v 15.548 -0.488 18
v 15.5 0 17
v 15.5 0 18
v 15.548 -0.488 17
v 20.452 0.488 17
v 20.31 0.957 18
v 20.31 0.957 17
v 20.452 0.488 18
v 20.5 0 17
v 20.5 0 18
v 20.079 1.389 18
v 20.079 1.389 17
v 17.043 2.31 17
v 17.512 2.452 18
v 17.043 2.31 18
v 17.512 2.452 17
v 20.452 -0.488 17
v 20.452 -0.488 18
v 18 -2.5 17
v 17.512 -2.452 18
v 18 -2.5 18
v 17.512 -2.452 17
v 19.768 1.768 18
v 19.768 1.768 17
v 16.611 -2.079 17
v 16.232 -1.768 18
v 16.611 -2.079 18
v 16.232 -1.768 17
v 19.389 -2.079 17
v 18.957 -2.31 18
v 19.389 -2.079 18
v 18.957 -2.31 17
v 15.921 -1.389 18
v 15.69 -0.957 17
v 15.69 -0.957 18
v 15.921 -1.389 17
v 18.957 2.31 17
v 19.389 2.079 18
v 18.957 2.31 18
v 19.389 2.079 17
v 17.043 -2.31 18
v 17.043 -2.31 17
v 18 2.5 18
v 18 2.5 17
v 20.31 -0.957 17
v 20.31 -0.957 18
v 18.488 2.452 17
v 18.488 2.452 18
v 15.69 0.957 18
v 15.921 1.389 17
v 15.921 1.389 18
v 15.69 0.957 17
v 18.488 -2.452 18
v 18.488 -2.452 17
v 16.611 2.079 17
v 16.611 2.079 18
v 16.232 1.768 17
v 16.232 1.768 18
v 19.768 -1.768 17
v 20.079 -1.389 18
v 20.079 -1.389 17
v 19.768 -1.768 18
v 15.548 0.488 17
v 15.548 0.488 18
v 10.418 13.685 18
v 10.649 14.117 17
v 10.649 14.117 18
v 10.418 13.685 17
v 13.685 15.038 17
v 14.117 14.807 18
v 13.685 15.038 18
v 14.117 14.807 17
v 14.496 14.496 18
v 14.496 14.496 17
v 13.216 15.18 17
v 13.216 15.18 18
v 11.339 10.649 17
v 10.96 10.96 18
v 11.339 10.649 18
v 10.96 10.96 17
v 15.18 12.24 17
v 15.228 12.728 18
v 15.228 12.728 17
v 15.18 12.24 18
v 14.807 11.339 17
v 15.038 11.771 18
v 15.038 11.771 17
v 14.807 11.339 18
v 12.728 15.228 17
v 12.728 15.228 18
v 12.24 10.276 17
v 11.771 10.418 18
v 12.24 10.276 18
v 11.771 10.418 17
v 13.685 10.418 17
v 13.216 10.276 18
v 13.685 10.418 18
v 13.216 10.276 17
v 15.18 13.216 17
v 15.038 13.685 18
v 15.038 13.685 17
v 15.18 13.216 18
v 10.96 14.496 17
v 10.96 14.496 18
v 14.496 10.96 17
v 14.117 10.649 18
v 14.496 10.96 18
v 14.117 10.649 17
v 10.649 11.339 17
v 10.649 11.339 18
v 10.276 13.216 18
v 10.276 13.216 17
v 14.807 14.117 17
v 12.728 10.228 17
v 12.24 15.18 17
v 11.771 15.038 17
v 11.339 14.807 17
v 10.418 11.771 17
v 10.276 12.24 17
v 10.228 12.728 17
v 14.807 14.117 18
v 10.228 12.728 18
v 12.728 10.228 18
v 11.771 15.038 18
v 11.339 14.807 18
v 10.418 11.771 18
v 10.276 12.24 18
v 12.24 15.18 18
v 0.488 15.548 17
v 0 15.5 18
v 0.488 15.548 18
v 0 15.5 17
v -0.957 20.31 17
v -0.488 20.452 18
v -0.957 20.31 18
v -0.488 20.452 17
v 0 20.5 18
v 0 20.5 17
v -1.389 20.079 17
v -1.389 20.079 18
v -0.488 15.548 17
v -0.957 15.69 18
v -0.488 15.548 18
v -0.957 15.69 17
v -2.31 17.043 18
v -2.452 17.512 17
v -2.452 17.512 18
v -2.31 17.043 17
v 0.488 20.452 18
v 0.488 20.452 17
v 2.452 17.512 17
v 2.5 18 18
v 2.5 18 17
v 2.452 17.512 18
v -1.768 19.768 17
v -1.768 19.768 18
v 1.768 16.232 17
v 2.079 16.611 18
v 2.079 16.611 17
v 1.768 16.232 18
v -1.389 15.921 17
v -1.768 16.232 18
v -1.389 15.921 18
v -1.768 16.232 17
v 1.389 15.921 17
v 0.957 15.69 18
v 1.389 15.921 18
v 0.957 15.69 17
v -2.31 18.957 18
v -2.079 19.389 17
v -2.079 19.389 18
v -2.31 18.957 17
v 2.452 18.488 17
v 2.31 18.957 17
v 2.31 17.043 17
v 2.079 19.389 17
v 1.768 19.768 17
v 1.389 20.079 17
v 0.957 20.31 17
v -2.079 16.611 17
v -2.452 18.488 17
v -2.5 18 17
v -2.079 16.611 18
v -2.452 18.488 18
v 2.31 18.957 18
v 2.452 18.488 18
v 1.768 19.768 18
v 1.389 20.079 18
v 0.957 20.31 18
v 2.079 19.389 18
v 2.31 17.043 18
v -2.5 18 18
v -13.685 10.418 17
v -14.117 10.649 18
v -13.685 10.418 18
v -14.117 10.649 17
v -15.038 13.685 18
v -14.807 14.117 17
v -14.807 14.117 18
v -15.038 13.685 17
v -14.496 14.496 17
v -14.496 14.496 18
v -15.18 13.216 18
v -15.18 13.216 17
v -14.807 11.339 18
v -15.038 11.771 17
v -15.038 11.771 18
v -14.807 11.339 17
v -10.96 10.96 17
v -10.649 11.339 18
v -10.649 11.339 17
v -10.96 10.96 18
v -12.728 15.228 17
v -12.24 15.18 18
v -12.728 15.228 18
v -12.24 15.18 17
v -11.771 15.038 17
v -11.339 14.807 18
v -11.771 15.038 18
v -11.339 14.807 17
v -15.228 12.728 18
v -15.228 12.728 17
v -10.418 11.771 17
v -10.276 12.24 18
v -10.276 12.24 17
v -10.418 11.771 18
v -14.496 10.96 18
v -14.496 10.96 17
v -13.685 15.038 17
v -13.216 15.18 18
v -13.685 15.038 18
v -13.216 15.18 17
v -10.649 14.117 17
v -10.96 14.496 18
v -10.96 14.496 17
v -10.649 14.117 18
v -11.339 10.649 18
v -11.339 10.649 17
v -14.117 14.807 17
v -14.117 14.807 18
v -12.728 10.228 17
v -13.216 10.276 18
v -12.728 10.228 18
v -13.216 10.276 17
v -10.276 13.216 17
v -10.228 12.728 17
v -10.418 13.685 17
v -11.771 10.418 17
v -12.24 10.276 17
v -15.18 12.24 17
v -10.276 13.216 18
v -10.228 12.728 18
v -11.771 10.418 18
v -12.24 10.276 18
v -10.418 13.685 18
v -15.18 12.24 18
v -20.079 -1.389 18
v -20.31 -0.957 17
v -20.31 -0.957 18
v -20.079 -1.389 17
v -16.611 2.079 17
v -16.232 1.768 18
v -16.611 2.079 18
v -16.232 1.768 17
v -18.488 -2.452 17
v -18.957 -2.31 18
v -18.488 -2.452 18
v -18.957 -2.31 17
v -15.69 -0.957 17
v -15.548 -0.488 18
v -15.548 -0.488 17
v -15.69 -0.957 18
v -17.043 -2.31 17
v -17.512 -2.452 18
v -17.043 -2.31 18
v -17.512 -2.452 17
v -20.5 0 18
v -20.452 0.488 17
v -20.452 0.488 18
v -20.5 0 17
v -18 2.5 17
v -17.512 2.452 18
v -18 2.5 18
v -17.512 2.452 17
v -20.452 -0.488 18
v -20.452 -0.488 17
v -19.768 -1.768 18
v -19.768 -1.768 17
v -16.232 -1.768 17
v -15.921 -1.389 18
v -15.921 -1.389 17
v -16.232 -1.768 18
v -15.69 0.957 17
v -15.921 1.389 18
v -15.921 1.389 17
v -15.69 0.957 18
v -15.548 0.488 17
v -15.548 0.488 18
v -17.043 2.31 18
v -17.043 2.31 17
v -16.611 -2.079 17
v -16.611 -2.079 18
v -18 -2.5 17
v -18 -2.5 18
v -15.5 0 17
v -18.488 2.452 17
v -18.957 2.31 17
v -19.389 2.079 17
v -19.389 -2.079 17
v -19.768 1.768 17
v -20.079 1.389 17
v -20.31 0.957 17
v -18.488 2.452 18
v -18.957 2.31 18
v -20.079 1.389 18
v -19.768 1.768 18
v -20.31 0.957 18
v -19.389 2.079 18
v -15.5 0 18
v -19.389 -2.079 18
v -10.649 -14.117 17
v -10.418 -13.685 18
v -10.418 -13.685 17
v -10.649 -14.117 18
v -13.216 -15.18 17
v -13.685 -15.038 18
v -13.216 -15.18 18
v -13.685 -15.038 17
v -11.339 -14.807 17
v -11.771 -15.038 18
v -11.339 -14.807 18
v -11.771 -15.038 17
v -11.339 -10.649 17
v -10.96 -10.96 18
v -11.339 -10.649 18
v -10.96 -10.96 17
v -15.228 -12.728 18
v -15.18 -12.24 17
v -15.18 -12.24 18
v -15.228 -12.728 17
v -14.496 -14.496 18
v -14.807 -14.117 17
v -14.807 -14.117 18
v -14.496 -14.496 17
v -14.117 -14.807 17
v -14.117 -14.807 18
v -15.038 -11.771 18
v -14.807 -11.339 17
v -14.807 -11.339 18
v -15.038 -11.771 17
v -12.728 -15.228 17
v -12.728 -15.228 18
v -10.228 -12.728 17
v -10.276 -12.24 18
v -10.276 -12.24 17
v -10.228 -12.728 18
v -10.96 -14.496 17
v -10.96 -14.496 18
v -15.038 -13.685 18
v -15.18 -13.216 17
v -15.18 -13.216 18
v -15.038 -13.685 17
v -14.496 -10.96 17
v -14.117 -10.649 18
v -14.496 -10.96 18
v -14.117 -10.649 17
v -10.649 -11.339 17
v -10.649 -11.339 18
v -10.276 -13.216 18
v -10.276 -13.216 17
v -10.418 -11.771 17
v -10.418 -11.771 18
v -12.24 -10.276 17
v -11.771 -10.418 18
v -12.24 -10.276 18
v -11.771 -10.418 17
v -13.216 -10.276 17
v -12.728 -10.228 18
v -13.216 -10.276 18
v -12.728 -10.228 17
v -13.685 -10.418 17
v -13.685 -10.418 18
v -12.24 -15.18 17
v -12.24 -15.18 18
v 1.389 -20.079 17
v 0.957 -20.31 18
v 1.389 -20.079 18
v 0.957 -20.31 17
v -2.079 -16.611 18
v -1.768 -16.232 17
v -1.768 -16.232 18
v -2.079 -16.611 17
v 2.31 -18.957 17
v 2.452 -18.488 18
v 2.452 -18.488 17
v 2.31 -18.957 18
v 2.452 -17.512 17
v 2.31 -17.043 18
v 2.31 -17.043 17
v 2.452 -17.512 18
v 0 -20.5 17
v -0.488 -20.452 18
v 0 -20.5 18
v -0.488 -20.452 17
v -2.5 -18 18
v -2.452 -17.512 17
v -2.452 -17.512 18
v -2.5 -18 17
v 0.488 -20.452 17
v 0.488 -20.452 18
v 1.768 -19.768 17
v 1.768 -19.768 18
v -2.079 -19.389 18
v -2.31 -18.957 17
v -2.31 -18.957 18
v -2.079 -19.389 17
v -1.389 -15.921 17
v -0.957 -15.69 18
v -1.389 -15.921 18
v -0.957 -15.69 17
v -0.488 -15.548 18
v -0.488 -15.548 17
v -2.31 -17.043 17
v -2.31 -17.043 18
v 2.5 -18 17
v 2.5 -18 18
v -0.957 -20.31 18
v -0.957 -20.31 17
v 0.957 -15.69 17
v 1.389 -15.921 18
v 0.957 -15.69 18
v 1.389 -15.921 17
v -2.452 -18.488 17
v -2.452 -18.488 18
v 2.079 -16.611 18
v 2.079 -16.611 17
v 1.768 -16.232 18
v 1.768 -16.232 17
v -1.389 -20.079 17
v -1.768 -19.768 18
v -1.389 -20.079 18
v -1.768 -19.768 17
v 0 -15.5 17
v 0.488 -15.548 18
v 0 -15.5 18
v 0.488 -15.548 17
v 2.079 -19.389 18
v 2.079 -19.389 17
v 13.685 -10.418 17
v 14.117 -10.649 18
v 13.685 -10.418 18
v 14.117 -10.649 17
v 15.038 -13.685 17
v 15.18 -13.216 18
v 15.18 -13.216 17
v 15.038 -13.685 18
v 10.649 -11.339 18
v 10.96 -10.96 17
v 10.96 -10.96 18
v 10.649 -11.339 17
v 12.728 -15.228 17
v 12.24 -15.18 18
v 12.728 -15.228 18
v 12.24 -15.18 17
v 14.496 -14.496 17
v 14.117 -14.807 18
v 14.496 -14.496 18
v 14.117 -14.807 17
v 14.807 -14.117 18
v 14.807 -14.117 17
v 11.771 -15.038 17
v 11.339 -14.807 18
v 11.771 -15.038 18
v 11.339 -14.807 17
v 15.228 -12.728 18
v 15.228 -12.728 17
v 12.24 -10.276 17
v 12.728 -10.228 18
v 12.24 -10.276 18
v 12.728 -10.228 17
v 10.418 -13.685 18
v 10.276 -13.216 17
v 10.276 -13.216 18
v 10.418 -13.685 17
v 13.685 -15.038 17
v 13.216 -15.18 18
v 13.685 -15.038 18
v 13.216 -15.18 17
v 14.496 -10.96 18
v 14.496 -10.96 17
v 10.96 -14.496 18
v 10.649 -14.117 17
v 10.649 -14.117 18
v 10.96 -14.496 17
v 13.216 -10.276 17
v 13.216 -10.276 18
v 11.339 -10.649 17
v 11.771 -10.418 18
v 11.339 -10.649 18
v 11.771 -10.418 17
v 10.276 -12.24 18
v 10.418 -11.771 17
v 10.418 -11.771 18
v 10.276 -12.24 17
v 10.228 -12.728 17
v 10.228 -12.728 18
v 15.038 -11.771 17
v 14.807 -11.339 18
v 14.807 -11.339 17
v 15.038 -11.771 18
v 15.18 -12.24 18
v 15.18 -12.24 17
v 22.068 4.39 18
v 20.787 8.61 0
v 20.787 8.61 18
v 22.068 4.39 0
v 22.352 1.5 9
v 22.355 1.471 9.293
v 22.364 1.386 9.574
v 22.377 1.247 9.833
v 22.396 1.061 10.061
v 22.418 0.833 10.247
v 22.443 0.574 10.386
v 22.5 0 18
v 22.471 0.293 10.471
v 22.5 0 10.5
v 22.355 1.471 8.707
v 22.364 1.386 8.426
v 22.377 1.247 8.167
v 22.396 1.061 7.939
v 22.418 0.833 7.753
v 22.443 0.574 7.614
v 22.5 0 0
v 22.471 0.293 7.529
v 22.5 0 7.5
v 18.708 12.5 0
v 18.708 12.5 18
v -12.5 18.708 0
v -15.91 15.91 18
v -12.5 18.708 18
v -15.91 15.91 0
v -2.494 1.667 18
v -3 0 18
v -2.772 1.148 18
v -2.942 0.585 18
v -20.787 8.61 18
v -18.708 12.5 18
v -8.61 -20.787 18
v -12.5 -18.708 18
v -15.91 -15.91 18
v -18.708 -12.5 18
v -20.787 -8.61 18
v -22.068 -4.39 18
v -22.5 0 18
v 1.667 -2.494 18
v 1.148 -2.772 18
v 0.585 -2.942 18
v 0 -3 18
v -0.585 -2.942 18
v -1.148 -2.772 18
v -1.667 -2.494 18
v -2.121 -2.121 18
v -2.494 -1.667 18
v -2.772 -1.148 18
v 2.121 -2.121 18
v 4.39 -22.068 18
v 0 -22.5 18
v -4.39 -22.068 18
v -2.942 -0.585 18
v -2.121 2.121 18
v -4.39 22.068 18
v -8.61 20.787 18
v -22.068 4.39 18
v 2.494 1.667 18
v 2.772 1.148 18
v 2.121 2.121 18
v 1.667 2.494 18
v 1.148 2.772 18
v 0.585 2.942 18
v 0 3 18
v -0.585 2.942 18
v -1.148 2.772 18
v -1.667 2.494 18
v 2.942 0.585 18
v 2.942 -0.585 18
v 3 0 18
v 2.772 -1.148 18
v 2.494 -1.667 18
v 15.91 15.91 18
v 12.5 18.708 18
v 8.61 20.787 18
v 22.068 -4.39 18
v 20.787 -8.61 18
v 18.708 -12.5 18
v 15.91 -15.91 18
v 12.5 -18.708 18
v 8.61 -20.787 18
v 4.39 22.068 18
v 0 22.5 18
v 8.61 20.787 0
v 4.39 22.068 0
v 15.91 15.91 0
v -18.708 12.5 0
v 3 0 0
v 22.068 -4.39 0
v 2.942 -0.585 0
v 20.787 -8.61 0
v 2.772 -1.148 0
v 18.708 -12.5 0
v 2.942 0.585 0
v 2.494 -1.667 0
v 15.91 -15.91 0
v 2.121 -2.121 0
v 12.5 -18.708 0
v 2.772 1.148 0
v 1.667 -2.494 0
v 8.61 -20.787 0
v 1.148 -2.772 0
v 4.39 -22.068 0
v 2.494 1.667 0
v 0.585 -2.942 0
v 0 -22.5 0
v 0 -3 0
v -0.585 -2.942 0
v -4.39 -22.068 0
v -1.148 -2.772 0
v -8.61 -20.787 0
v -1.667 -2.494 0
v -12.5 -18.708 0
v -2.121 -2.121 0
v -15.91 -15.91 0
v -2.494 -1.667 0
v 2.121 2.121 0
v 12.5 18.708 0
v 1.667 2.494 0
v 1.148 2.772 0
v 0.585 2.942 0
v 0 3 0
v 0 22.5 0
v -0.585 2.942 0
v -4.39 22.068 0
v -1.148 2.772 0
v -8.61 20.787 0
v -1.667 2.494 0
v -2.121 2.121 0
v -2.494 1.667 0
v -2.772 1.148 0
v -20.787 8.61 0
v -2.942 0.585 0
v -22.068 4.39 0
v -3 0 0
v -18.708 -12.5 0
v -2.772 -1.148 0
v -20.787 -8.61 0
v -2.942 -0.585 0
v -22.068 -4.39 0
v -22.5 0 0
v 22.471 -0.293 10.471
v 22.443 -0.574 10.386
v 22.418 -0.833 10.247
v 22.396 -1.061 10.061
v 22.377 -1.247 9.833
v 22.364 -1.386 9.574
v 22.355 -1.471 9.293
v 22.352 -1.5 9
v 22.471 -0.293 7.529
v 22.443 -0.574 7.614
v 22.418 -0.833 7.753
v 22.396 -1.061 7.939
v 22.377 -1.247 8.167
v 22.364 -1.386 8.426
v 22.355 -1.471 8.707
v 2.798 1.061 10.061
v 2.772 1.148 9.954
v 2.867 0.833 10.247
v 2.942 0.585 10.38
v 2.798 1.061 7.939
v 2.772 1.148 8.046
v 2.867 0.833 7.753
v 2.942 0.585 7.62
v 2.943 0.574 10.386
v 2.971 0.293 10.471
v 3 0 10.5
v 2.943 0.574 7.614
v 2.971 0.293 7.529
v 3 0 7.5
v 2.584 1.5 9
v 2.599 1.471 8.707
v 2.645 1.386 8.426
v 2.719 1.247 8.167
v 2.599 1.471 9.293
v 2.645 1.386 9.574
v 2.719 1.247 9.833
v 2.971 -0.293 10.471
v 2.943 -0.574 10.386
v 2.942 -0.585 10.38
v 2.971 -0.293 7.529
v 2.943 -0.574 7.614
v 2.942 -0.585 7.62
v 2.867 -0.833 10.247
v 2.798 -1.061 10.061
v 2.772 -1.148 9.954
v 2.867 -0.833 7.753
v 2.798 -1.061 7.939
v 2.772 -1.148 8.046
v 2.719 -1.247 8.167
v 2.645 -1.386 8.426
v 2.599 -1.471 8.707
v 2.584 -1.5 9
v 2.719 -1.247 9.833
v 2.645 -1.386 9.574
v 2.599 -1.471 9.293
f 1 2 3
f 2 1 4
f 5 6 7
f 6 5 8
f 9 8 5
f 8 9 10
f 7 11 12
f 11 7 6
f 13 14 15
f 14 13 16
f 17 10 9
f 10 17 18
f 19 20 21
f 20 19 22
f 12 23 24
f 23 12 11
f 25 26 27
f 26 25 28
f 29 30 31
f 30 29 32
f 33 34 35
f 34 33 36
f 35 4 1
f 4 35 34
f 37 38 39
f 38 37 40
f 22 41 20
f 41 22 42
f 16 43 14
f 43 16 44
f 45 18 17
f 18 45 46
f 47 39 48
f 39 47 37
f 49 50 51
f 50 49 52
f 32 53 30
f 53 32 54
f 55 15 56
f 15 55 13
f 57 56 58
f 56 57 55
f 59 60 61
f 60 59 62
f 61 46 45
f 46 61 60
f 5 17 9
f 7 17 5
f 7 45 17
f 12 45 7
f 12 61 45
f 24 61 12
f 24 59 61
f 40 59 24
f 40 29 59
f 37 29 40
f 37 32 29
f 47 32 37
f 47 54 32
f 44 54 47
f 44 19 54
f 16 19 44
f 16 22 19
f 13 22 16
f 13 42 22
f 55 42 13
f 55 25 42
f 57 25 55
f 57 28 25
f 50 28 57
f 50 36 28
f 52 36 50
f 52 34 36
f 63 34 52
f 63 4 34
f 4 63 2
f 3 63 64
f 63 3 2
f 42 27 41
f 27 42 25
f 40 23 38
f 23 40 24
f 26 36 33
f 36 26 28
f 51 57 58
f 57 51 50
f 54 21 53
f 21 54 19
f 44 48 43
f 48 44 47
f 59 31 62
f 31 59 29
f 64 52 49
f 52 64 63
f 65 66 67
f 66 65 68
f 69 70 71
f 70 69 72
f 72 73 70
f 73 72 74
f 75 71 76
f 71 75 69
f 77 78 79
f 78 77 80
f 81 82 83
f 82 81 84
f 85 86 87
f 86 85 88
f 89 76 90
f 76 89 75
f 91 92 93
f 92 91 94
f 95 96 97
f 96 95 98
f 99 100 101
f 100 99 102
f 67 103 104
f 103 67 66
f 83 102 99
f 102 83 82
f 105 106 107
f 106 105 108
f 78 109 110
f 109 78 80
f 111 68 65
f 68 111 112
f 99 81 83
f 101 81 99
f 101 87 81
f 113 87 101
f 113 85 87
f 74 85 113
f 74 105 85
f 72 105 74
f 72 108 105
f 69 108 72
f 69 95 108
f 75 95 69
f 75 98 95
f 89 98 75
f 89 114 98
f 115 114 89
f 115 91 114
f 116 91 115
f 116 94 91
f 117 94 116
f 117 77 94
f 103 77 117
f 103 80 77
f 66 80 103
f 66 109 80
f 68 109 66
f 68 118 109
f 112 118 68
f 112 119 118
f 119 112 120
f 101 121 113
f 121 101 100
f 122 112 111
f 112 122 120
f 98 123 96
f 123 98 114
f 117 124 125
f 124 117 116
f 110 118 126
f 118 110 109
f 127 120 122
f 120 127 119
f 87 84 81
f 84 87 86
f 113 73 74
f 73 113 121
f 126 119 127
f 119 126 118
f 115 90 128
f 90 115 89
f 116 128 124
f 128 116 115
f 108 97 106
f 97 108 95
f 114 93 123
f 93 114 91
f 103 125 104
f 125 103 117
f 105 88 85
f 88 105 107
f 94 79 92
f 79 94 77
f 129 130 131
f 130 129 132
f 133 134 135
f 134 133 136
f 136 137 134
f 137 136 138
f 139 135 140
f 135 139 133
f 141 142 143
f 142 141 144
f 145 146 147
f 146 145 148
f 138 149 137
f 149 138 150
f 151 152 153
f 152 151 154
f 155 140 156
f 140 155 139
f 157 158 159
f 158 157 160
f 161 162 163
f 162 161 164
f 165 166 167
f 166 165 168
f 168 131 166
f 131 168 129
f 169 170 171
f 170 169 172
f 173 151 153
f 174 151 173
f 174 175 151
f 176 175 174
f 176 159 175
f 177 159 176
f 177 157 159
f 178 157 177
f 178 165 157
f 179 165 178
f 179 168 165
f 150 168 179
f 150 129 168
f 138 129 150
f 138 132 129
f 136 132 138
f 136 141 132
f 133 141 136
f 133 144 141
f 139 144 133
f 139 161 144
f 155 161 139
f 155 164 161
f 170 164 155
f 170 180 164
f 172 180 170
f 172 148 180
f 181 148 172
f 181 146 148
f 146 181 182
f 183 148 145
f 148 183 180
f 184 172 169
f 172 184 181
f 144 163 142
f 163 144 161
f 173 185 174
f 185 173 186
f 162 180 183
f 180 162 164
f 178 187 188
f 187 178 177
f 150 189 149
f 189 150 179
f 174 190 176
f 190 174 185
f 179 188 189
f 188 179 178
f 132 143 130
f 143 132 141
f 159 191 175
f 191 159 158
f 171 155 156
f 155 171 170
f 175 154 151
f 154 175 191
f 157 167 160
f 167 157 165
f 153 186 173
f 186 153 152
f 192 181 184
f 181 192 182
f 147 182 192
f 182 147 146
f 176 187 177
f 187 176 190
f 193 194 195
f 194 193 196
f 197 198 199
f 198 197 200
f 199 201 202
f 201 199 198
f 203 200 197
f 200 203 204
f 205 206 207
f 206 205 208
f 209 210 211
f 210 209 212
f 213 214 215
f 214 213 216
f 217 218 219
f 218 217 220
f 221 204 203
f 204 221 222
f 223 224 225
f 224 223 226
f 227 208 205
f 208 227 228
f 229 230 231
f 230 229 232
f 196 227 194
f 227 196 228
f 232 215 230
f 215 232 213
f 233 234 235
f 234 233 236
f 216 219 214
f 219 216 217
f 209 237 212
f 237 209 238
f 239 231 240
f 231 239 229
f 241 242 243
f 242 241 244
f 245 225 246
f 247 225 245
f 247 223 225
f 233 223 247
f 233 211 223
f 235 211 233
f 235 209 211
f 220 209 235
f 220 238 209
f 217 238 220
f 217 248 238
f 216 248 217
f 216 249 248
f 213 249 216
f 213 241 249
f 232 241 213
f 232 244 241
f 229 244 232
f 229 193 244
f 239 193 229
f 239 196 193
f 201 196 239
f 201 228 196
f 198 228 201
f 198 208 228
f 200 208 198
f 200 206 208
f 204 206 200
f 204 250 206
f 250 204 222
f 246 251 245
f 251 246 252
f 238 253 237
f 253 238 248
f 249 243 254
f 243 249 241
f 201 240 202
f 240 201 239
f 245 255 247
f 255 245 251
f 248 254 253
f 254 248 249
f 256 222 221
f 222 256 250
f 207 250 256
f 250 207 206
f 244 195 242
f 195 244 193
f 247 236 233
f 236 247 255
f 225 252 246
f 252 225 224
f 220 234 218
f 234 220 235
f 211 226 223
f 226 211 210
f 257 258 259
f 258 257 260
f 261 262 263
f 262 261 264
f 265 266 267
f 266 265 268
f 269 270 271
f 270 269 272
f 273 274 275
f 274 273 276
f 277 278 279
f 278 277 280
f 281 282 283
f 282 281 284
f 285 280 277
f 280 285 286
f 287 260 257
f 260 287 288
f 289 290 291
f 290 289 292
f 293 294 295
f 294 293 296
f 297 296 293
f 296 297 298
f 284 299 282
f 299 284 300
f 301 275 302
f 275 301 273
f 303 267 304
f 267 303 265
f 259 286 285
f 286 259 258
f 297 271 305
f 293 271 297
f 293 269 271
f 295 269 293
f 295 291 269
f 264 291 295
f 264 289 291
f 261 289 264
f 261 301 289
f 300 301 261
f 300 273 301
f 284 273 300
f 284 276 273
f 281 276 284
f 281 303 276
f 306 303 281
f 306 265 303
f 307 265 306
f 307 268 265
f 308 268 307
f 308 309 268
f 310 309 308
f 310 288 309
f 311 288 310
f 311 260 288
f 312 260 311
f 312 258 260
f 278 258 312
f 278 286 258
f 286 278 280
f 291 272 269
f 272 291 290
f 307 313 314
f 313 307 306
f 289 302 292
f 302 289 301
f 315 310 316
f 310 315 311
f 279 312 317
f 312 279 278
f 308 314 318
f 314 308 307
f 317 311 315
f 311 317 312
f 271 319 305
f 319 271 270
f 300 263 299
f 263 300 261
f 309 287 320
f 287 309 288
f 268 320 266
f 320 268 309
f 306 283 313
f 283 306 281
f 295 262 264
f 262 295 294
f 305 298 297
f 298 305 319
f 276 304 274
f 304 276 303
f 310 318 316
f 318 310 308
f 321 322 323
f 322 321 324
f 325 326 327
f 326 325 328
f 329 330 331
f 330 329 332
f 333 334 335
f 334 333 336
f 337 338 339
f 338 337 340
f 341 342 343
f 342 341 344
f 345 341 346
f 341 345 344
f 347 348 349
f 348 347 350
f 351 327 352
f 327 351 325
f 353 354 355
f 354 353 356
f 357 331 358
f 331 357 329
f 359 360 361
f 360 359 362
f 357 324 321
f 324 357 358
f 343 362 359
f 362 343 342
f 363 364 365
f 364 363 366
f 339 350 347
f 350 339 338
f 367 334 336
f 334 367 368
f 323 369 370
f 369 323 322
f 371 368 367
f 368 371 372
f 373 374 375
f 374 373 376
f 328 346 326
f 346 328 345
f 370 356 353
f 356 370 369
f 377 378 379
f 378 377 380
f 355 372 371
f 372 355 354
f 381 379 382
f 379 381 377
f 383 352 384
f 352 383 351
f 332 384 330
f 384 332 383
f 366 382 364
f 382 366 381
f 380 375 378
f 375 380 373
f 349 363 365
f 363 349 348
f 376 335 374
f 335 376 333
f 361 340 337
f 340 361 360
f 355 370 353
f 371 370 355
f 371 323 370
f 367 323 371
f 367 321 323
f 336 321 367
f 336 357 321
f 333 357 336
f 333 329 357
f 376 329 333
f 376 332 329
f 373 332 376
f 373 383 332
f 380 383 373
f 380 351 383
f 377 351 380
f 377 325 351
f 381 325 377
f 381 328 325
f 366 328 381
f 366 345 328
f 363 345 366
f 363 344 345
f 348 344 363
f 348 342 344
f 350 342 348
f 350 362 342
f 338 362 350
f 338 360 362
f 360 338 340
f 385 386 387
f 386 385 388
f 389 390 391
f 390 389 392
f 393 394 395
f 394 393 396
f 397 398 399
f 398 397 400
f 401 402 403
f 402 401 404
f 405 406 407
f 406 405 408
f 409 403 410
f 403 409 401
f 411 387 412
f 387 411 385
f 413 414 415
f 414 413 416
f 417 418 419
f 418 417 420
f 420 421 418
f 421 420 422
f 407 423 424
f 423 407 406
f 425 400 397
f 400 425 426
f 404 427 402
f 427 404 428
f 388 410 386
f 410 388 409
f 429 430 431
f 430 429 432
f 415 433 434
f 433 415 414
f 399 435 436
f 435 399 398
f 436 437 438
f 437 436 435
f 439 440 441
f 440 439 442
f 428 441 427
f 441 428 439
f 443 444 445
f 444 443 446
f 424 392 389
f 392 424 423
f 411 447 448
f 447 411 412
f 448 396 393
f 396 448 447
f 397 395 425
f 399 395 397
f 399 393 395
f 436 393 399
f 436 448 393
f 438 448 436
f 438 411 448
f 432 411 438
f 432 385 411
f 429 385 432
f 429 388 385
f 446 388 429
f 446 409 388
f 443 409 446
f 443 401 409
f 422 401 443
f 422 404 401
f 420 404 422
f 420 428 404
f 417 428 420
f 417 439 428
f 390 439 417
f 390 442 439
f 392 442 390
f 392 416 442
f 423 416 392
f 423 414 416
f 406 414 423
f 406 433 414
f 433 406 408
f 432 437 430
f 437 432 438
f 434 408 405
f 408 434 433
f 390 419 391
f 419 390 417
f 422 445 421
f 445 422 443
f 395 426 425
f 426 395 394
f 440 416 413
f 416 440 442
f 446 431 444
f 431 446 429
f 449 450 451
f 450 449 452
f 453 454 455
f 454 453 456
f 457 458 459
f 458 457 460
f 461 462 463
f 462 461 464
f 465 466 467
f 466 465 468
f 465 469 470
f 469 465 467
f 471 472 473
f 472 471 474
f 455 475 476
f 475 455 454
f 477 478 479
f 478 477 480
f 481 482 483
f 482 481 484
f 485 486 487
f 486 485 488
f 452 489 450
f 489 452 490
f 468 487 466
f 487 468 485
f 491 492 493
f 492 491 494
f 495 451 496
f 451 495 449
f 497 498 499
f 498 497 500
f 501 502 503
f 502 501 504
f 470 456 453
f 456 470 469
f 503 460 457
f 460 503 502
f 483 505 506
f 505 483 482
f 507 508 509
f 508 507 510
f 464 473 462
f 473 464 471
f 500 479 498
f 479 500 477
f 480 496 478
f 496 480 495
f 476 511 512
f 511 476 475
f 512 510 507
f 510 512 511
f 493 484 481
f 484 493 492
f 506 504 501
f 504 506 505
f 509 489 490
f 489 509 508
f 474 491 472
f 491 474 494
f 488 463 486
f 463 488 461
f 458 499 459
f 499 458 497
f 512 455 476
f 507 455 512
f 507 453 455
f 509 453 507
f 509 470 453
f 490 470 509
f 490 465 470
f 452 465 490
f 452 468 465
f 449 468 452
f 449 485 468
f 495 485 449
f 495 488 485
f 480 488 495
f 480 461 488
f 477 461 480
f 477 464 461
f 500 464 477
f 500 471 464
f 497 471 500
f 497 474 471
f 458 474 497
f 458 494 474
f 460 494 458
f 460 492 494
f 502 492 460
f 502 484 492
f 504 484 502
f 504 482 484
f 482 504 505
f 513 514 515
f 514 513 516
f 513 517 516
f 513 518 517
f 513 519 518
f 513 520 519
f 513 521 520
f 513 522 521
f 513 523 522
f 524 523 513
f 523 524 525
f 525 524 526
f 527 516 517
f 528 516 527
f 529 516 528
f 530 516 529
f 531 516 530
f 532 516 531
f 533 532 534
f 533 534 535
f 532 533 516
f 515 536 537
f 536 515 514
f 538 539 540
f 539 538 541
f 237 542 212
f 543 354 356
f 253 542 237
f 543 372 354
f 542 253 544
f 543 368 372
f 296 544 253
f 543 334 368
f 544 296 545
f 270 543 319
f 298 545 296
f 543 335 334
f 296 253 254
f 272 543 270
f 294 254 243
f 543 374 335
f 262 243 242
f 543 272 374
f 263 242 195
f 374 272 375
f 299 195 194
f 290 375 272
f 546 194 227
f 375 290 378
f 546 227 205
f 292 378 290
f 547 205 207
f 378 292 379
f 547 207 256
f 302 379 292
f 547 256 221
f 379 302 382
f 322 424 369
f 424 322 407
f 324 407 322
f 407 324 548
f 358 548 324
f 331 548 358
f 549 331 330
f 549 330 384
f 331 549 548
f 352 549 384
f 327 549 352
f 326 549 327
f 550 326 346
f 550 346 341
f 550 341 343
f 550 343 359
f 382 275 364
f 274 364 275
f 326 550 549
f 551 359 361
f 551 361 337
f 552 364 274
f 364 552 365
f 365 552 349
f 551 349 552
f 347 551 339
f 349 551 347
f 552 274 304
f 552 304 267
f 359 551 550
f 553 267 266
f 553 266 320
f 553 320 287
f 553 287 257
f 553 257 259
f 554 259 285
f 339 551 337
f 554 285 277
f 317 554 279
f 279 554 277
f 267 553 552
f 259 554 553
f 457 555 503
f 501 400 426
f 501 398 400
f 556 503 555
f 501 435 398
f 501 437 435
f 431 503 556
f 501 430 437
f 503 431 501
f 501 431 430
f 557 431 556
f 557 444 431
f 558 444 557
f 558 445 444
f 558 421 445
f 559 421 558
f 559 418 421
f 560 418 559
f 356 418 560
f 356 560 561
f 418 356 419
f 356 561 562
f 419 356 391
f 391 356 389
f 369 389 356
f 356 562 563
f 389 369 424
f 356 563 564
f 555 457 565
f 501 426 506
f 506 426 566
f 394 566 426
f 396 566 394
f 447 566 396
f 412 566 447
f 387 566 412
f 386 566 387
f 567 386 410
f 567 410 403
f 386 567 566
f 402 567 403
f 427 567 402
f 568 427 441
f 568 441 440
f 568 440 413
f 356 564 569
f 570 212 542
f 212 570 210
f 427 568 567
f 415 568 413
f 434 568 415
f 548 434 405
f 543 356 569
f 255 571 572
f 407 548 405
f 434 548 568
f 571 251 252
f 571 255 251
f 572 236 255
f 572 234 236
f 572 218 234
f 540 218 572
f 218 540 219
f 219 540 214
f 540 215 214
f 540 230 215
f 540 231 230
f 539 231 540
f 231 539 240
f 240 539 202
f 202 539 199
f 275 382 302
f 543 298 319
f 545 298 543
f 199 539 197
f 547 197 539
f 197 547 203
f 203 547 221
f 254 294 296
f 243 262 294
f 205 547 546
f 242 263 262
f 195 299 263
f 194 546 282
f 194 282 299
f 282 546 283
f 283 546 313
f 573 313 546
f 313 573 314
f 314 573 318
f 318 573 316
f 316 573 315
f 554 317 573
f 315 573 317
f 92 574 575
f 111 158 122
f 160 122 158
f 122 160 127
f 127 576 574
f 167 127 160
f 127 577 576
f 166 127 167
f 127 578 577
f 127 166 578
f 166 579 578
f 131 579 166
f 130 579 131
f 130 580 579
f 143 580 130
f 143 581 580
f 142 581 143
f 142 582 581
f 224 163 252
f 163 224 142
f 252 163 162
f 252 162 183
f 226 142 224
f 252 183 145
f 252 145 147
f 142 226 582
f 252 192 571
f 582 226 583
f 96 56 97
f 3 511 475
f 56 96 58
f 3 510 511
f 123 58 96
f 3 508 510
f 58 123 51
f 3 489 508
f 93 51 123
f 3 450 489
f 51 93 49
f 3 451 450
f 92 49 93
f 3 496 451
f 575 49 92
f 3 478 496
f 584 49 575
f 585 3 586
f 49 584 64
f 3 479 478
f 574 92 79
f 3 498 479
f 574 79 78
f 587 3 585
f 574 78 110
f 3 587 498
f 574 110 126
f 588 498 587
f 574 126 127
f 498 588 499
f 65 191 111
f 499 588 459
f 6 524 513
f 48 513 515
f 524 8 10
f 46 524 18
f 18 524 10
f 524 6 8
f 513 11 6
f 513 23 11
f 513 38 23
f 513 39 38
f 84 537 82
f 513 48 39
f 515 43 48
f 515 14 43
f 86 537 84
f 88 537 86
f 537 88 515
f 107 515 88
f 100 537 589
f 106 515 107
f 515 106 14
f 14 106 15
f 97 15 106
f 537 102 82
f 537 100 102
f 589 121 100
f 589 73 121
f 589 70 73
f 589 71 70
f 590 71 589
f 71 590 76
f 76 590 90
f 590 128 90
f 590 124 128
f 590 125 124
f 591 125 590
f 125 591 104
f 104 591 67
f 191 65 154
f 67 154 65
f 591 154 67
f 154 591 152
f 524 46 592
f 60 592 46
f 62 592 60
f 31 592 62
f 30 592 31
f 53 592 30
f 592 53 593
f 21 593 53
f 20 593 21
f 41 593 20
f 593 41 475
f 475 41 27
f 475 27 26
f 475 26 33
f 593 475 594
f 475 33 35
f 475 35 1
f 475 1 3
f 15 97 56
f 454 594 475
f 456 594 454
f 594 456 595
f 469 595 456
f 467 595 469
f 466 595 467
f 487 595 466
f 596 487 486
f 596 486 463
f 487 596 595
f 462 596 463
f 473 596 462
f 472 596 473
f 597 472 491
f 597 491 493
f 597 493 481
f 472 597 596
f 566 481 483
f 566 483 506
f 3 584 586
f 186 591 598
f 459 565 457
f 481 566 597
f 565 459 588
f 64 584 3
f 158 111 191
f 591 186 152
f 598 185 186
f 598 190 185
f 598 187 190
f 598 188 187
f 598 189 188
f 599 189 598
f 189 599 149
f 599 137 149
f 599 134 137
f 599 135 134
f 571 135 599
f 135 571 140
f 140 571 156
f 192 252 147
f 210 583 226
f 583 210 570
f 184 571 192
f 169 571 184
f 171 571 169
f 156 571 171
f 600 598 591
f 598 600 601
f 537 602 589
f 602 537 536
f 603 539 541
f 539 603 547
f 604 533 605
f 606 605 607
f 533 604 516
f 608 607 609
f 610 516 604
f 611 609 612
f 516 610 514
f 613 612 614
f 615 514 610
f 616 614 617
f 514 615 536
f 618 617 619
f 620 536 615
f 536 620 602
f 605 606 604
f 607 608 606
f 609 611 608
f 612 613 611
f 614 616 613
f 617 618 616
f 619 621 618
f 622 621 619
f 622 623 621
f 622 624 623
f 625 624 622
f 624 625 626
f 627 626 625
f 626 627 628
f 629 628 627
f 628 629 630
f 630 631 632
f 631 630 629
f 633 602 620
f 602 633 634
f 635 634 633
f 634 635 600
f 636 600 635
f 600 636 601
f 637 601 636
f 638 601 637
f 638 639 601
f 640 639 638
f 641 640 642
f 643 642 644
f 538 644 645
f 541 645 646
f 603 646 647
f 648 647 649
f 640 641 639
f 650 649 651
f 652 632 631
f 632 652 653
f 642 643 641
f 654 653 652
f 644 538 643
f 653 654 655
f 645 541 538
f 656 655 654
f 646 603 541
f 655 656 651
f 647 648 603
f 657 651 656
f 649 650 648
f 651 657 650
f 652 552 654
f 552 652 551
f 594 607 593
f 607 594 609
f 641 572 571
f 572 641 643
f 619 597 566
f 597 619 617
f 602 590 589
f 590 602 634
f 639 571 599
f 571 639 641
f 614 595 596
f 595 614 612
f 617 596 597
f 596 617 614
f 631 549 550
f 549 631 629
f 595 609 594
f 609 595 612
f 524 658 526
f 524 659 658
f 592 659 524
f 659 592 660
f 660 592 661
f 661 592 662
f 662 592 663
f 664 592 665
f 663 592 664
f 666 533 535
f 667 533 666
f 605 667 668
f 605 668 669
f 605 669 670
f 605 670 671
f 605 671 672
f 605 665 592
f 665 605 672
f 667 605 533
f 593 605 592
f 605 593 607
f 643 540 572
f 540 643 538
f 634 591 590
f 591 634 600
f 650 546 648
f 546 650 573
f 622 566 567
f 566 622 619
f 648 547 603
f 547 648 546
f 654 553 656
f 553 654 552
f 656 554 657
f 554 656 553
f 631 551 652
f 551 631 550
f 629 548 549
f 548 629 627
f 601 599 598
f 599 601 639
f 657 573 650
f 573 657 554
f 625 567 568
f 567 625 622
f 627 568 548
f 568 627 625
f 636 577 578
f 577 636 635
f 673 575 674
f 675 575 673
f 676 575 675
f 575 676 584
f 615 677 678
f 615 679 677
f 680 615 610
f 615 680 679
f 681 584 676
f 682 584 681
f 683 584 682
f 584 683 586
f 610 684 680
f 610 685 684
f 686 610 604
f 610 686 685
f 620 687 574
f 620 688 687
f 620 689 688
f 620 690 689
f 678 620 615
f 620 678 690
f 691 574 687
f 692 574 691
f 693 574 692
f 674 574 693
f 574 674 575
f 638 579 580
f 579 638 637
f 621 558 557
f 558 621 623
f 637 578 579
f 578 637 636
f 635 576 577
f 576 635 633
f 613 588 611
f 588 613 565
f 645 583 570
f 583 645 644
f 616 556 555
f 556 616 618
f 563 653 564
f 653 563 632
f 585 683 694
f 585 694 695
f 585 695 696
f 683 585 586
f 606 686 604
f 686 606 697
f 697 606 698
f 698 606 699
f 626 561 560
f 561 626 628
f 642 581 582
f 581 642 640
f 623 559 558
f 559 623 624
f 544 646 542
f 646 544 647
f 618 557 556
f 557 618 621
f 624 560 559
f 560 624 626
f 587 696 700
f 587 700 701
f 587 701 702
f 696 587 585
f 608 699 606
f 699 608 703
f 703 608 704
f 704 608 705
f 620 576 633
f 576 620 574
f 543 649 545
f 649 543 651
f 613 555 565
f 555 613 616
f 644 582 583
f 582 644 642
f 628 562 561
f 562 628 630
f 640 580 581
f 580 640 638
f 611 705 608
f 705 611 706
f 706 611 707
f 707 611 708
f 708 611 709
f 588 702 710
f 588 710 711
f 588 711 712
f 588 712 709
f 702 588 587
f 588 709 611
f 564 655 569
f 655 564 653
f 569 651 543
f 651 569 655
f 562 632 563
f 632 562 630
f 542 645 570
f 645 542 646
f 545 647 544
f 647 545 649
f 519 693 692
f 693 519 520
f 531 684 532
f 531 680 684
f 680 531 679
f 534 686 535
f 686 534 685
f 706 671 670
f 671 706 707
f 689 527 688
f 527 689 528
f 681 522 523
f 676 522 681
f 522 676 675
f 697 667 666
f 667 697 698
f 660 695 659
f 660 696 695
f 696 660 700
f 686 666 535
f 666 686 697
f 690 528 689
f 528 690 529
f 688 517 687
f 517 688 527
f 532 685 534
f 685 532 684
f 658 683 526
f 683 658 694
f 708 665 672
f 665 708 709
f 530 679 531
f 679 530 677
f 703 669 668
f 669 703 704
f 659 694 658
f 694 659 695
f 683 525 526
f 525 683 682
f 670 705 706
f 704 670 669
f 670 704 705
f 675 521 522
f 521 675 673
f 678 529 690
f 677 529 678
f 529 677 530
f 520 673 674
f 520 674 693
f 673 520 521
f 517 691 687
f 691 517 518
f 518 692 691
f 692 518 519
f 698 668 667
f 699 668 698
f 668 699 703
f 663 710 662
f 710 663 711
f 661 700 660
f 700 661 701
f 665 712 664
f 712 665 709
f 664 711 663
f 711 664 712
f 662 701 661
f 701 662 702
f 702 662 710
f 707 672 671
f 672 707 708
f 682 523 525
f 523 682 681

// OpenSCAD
$fn = 32;

// ----------------------------------------------------------------------
// Control knob: dimpled knob
// ----------------------------------------------------------------------

// --- parameters (mm) ---
dimp_d = 5;               // finger dimple diameter
n_dimp = 8;               // number of dimples
dimp_r = 18;              // dimple ring radius
knob_d = 45;              // knob body diameter
knob_h = 18;              // knob body height
bore_d = 6;               // shaft bore diameter
set_d = 3;                // set screw bore diameter

dimp_step = 360 / n_dimp;  // dimple angular step

difference() {
  cylinder(h = knob_h, d = knob_d);
  translate([0, 0, -1]) cylinder(h = knob_h + 2, d = bore_d);
  translate([-1, 0, knob_h / 2]) rotate([0, 90, 0])
    cylinder(h = knob_d / 2 + bore_d / 2 + 2, d = set_d);  for (i = [0 : n_dimp - 1])
    rotate([0, 0, i * dimp_step])
      translate([dimp_r, 0, knob_h - 1])
        cylinder(h = 2, d = dimp_d);
}
